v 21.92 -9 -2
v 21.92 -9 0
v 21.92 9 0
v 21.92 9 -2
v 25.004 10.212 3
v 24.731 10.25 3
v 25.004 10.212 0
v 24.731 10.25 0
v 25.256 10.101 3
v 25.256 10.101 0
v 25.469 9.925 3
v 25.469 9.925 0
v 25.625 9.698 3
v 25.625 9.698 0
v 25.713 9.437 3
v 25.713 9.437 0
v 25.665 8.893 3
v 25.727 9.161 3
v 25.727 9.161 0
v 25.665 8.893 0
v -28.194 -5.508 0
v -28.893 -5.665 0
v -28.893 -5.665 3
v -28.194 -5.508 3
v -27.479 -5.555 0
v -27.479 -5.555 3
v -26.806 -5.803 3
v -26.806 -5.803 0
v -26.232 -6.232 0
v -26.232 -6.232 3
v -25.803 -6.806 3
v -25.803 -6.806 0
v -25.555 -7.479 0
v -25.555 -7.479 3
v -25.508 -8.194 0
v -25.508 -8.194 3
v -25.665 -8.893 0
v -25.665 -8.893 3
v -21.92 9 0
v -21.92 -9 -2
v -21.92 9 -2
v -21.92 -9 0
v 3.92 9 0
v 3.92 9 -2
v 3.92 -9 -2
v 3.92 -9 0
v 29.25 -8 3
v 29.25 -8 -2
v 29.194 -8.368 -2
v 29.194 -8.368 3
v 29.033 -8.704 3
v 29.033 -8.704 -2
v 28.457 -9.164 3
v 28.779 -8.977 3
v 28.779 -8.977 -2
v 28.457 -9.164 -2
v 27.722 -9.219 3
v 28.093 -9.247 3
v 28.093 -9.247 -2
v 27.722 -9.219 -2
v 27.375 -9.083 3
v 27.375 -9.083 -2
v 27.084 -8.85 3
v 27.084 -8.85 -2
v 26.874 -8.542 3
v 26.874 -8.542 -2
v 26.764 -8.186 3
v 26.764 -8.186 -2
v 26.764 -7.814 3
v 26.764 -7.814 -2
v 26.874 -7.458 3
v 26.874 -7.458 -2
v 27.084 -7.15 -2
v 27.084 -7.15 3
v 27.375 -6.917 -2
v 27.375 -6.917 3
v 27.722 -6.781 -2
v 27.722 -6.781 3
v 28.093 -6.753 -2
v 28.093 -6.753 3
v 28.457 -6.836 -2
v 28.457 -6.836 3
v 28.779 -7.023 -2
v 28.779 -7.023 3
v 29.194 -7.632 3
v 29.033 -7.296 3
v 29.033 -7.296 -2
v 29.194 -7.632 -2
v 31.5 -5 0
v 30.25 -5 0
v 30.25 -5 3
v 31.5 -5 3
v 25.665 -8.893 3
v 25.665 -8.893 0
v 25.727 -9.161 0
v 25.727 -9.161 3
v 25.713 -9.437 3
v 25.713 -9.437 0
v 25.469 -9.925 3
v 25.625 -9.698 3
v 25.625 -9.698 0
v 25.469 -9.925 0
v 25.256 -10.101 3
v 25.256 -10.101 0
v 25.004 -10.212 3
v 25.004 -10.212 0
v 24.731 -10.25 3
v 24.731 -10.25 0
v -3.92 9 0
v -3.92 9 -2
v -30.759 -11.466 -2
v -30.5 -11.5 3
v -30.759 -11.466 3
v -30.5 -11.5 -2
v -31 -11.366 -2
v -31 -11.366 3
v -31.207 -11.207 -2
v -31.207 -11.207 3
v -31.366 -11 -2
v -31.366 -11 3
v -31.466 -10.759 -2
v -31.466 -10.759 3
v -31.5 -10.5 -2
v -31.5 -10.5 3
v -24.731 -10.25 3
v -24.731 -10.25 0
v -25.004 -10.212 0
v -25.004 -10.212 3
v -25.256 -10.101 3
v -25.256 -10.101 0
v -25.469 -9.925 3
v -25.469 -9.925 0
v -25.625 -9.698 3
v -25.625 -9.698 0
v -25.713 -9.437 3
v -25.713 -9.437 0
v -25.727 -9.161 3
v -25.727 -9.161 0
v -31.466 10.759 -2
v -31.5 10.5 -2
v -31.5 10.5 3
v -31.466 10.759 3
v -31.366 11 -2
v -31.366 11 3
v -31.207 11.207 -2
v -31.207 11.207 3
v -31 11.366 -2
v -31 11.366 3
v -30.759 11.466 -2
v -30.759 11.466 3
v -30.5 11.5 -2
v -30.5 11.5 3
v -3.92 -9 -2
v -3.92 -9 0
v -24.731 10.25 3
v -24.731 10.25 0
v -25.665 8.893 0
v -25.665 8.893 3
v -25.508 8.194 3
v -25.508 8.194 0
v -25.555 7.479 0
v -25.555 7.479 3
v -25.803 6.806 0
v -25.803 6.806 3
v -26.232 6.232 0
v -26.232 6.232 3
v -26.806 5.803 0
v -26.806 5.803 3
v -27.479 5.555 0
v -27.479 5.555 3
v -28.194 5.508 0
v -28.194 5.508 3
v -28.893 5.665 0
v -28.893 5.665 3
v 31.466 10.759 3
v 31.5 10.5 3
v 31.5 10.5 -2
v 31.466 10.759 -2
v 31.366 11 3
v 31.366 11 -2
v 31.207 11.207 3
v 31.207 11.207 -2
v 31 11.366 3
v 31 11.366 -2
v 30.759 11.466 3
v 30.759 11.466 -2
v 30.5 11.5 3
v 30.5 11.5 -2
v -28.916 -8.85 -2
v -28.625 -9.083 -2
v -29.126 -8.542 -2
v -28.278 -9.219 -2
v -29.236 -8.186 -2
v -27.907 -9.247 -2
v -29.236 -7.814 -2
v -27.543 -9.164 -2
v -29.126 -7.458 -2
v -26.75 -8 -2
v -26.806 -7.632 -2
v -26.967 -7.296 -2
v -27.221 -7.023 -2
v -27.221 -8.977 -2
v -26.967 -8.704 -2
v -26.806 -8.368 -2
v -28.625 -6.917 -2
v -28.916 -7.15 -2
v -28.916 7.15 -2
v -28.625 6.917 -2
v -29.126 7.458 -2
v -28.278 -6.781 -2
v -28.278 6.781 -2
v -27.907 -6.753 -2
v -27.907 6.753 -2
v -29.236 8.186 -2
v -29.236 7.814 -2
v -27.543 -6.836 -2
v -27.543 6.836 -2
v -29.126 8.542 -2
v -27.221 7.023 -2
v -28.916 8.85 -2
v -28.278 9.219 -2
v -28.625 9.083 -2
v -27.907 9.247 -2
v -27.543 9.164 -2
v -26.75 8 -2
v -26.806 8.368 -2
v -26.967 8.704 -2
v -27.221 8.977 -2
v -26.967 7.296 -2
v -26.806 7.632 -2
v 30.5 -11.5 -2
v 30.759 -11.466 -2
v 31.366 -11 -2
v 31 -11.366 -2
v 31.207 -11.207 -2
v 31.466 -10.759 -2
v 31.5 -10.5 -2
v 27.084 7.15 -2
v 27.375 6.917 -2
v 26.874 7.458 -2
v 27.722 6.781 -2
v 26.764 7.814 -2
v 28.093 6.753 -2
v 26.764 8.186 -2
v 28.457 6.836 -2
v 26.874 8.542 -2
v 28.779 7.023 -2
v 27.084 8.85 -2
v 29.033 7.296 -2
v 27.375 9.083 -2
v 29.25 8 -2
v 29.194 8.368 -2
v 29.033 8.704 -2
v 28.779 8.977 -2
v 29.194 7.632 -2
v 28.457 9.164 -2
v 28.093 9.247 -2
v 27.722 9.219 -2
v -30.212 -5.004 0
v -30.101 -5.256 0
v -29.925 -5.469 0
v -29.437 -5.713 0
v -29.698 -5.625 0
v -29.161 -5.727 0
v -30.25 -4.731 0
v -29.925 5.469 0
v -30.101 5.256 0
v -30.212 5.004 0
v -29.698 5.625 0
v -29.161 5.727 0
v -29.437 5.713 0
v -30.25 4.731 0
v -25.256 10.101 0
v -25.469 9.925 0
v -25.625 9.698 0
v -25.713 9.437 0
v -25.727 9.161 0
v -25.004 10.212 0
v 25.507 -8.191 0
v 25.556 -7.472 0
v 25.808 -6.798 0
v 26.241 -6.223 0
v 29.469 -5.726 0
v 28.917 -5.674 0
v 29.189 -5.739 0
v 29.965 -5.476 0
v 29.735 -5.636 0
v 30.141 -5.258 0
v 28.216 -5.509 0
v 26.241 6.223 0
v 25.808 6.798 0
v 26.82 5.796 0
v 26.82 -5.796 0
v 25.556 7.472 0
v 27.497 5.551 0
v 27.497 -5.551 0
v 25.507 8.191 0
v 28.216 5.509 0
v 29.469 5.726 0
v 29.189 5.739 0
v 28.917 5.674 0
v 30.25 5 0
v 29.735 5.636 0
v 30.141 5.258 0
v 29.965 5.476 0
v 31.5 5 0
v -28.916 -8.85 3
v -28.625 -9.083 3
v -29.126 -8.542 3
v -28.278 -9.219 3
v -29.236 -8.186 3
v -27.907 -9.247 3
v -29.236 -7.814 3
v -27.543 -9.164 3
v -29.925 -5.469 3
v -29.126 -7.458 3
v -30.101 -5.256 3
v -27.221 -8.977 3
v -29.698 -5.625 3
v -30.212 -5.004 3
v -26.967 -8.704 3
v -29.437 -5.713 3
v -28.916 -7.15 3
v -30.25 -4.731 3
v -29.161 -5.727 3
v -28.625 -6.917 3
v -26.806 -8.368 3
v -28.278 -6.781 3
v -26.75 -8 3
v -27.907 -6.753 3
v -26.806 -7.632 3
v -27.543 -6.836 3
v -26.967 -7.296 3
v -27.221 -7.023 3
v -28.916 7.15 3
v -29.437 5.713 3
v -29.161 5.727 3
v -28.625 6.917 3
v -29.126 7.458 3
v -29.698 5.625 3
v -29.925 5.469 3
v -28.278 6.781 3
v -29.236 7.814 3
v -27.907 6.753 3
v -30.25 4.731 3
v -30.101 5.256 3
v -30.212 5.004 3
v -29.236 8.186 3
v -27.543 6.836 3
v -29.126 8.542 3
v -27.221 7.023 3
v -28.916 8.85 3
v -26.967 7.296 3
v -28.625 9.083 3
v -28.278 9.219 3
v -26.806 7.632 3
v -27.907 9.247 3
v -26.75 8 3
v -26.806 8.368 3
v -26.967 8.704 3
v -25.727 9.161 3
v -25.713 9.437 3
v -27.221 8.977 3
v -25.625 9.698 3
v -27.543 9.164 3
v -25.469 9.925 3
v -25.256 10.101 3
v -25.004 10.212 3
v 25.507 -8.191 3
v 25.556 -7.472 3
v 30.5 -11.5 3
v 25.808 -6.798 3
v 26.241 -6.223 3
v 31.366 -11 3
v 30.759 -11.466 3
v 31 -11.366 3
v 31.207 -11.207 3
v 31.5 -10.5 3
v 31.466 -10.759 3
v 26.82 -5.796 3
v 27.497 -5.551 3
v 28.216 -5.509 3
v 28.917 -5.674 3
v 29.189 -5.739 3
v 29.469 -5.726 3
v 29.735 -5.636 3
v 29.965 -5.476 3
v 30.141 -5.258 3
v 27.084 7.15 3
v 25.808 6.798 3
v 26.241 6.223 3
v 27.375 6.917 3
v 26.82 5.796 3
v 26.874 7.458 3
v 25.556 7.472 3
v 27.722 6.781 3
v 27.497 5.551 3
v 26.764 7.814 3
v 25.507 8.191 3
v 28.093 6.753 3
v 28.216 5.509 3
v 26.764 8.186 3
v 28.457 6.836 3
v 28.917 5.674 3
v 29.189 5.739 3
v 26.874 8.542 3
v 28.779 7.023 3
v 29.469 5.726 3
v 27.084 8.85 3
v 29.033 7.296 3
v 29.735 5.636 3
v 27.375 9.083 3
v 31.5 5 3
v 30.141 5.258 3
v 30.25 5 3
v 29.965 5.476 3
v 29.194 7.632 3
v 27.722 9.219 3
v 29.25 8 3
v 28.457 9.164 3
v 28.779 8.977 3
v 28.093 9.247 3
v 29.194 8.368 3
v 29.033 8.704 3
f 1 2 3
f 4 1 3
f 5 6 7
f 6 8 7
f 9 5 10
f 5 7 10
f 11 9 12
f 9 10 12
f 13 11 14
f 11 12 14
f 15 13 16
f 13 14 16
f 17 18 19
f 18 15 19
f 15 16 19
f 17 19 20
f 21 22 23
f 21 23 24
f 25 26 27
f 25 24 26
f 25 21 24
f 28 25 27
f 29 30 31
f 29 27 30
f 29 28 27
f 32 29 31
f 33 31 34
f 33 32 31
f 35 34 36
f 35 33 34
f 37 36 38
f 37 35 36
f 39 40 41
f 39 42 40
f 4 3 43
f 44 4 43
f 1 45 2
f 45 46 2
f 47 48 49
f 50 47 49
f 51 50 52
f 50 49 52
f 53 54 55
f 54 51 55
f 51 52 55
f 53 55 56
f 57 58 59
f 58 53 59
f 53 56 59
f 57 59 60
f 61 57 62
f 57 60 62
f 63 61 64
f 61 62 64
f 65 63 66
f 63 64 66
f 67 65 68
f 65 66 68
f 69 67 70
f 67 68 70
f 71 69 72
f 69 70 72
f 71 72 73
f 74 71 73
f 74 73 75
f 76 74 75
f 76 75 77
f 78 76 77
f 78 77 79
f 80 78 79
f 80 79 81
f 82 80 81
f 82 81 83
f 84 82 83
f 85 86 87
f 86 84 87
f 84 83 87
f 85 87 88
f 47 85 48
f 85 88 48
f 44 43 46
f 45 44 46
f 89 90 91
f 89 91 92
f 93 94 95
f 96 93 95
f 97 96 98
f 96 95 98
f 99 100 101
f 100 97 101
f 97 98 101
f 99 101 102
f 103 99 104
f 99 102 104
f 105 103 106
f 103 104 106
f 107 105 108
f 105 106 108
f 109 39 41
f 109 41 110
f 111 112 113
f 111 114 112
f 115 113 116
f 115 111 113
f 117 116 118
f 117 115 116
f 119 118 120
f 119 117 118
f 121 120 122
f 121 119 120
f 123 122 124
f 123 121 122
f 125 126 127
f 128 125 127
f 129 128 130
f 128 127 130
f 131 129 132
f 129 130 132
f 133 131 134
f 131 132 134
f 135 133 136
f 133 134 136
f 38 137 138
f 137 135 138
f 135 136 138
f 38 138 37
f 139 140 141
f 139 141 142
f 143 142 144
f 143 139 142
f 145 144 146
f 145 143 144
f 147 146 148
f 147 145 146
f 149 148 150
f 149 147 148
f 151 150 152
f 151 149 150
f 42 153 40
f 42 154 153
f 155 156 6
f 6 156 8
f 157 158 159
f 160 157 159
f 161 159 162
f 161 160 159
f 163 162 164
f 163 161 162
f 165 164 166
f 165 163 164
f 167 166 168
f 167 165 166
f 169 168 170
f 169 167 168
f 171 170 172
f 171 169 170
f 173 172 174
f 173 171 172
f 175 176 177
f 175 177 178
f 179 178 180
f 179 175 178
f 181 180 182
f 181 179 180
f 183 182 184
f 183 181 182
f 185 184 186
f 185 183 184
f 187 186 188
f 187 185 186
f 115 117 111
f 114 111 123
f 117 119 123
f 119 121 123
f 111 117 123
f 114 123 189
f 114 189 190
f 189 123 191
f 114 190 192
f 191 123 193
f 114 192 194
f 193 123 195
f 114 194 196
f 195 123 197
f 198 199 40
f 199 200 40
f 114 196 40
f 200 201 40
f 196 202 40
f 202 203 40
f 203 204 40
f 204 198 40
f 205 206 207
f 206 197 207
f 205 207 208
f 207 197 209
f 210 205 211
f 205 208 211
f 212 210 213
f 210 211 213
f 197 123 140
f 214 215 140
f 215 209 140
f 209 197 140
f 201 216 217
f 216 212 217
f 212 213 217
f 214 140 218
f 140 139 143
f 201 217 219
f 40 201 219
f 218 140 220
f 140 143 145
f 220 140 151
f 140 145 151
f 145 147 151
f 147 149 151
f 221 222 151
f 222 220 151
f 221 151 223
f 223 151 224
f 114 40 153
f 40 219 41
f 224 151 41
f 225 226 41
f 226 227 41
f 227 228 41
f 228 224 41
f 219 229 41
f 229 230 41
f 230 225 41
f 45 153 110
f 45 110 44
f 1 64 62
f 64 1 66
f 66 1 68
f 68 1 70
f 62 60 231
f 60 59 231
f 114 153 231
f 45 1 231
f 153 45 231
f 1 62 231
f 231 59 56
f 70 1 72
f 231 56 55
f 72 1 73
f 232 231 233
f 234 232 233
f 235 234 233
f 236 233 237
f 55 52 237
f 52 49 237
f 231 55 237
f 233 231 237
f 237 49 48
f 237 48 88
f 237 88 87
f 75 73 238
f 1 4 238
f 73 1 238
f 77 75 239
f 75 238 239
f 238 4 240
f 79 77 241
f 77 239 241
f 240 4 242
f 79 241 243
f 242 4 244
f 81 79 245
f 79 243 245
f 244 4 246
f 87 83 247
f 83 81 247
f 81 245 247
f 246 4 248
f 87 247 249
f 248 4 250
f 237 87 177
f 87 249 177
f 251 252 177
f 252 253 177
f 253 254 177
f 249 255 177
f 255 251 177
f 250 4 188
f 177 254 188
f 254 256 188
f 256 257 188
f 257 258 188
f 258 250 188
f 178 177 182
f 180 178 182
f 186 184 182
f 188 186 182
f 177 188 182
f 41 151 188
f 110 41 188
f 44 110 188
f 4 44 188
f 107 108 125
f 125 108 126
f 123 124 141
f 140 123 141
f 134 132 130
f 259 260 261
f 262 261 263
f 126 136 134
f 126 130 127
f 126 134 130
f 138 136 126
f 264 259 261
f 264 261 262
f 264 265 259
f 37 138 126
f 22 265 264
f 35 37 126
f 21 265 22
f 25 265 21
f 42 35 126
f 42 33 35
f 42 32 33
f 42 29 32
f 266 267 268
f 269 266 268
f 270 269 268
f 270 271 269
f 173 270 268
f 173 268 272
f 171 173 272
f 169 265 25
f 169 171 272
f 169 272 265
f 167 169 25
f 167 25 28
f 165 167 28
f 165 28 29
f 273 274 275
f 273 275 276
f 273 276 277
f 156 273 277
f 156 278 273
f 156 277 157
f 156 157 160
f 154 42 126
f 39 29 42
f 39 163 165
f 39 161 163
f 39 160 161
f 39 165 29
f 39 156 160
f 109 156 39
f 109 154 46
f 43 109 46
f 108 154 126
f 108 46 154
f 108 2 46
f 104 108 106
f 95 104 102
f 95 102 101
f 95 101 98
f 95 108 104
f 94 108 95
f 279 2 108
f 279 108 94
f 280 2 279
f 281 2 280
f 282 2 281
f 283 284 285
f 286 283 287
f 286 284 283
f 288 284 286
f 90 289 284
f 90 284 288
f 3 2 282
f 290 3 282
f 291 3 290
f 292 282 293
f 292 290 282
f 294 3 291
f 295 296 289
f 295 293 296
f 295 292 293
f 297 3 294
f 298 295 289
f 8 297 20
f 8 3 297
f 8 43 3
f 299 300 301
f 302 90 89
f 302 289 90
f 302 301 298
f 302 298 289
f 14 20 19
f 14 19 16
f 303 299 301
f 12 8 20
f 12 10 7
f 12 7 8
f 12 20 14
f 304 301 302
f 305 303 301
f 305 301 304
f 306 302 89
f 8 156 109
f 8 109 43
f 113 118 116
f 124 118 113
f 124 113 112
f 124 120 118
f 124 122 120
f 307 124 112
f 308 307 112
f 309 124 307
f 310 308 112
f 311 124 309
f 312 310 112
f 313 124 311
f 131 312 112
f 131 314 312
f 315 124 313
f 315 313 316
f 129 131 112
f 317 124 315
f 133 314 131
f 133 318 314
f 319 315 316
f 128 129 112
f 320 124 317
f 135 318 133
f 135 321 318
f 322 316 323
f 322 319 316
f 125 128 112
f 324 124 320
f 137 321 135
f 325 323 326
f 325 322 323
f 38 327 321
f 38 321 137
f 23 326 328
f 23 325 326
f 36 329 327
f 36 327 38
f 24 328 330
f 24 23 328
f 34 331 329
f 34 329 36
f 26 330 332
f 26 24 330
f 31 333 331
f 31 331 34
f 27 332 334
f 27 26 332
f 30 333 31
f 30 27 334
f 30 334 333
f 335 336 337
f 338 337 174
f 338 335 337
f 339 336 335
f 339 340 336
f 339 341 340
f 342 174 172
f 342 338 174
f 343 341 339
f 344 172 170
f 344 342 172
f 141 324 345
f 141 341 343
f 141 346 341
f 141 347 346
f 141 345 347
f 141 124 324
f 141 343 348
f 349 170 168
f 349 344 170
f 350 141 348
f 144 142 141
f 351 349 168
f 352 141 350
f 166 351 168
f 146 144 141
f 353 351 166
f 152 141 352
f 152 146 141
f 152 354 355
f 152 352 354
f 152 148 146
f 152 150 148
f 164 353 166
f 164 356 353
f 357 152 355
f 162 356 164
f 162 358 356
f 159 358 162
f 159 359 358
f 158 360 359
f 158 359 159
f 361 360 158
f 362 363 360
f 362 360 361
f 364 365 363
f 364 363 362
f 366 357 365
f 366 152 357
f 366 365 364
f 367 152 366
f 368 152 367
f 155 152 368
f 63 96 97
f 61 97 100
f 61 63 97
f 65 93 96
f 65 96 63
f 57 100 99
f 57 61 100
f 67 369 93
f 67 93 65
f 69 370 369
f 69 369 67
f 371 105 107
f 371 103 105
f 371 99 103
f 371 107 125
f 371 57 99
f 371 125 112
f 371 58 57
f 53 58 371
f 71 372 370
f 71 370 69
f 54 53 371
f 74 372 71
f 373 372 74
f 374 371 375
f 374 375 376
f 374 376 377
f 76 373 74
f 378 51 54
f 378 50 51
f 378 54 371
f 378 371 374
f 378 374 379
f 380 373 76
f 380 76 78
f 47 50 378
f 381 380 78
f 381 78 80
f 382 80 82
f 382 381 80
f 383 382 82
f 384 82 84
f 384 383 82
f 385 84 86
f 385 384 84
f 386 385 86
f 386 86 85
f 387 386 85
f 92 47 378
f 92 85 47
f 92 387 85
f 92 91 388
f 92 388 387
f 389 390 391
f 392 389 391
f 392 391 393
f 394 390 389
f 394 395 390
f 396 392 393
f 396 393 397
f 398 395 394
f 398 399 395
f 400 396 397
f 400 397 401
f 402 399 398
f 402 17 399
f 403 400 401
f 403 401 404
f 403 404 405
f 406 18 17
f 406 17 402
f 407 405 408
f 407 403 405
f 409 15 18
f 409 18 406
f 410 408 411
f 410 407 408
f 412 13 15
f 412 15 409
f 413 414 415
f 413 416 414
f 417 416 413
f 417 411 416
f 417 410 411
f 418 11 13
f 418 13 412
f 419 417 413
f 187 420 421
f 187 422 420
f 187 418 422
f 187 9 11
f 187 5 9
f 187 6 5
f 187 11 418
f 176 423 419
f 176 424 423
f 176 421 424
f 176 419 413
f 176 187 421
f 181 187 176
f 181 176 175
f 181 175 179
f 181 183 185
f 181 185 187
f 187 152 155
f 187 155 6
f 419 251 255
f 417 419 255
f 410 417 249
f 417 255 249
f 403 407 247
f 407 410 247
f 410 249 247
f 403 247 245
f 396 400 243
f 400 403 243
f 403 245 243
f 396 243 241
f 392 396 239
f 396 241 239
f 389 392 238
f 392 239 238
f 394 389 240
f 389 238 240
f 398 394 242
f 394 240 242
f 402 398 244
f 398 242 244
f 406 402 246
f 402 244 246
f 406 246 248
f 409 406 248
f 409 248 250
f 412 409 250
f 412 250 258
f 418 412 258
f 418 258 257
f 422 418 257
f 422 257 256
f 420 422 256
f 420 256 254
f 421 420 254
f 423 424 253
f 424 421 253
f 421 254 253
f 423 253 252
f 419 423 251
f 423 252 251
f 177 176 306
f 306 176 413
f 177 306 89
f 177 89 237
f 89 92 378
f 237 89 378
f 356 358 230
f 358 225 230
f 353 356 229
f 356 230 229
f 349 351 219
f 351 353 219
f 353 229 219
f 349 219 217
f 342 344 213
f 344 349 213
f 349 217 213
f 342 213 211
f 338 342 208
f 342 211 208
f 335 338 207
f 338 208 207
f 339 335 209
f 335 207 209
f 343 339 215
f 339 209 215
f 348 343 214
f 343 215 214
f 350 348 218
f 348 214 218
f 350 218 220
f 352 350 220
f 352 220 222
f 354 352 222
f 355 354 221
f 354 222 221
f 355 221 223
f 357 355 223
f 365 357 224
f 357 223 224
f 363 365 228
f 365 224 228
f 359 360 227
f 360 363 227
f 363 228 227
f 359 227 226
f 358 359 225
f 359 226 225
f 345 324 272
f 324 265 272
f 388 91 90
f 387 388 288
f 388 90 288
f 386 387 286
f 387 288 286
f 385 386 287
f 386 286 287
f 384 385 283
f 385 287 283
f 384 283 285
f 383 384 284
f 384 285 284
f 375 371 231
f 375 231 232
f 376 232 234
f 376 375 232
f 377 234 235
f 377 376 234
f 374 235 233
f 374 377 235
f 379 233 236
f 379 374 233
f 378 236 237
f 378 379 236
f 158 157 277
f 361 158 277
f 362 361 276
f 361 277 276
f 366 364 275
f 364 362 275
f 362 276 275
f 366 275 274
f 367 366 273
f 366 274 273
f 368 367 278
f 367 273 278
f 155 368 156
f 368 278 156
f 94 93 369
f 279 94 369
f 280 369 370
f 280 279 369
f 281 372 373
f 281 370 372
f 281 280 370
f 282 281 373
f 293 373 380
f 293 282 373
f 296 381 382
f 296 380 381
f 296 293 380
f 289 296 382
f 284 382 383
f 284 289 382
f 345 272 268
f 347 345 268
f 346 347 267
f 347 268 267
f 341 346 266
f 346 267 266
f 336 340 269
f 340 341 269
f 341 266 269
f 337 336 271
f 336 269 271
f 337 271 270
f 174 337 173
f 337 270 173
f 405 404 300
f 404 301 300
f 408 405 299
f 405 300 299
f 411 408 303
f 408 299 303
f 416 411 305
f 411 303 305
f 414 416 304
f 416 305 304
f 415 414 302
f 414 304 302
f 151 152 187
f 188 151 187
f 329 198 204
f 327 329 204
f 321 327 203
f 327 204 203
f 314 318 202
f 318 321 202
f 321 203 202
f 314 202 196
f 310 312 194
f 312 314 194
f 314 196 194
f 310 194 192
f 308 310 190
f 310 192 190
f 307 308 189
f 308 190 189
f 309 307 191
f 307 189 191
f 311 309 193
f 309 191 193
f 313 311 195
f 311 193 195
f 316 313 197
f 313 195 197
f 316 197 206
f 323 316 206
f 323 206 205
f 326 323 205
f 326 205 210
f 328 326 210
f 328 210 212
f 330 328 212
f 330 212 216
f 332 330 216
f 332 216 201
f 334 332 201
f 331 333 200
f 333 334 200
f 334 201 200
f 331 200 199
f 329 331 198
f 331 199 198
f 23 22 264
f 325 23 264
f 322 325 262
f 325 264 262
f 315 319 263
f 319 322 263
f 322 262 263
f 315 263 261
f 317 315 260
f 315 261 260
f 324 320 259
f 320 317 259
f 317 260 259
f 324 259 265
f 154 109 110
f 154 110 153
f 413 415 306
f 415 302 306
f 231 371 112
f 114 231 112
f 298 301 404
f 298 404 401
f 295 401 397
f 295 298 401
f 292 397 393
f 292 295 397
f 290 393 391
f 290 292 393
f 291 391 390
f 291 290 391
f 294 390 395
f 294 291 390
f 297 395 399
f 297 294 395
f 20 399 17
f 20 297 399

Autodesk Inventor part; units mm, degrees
ref_plane "YZ Plane" through (0, 0, 0) normal (1, 0, 0) x (0, 1, 0)
ref_plane "XZ Plane" through (0, 0, 0) normal (0, 1, 0) x (-1, 0, 0)
ref_plane "XY Plane" through (0, 0, 0) normal (0, 0, 1) x (1, 0, 0)
sketch "スケッチ1" plane through (0, 0, 0) normal (0, 0, 1) x (1, 0, 0)
  line L0 (-31.5, 11.5) -> (31.5, 11.5)
  line L1 (31.5, 11.5) -> (31.5, -11.5)
  line L2 (31.5, -11.5) -> (-31.5, -11.5)
  line L3 (-31.5, -11.5) -> (-31.5, 11.5)
  line L4 (-31.5, 11.5) -> (31.5, -11.5) construction
  line L5 (31.5, 11.5) -> (-31.5, -11.5) construction
  line L6 (-30, 10) -> (30, 10) construction
  line L7 (30, 10) -> (30, -10) construction
  line L8 (30, -10) -> (-30, -10) construction
  line L9 (-30, -10) -> (-30, 10) construction
  line L10 (-30, 10) -> (30, -10) construction
  line L11 (30, 10) -> (-30, -10) construction
  circle A0 centre (-28, 8) radius 1.25
  line L12 (-31.5, 0) -> (31.5, 0) construction
  line L13 (0, 11.5) -> (0, -11.5) construction
  circle A1 centre (-28, -8) radius 1.25
  circle A2 centre (28, 8) radius 1.25
  circle A3 centre (28, -8) radius 1.25
  line L14 (-30.25, 10.25) -> (30.25, 10.25)
  line L15 (30.25, 10.25) -> (30.25, -10.25)
  line L16 (30.25, -10.25) -> (-30.25, -10.25)
  line L17 (-30.25, -10.25) -> (-30.25, 10.25)
  line L18 (-30.25, 10.25) -> (30.25, -10.25) construction
  line L19 (30.25, 10.25) -> (-30.25, -10.25) construction
  line L20 (-21.92, 9) -> (-3.92, 9)
  line L21 (-3.92, 9) -> (-3.92, -9)
  line L22 (-3.92, -9) -> (-21.92, -9)
  line L23 (-21.92, -9) -> (-21.92, 9)
  line L24 (-21.92, 9) -> (-3.92, -9) construction
  line L25 (-3.92, 9) -> (-21.92, -9) construction
  line L26 (21.92, 9) -> (3.92, 9)
  line L27 (3.92, 9) -> (3.92, -9)
  line L28 (3.92, -9) -> (21.92, -9)
  line L29 (21.92, -9) -> (21.92, 9)
  line L30 (21.92, 9) -> (3.92, -9) construction
  line L31 (3.92, 9) -> (21.92, -9) construction
  arc A4 (-30.25, 6.9103) -> (-26.9103, 10.25) centre (-28, 8) ccw
  arc A5 (-26.9103, -10.25) -> (-30.25, -6.9103) centre (-28, -8) ccw
  arc A6 (26.9103, 10.25) -> (30.25, 6.9103) centre (28, 8) ccw
  arc A7 (30.25, -6.9103) -> (26.9103, -10.25) centre (28, -8) ccw
  line L32 (30.25, 5) -> (31.5, 5)
  line L33 (30.25, -5) -> (31.5, -5)
  point P0 (0, 0)
  point P1 (0, 0)
  point P2 (-12.92, 0)
  point P3 (12.92, 0)
  point P4 (30.25, -6.9103)
  point P5 (26.9103, -10.25)
  point P6 (-30.25, -6.9103)
  point P7 (30.25, 6.9103)
  dimension "d0" = 63
  dimension "d1" = 60
  dimension "d2" = 20
  dimension "d3" = 23
  dimension "d4" = 2.5
  dimension "d5" = 2
  dimension "d6" = 2
  dimension "d7" = 20.5
  dimension "d8" = 60.5
  dimension "d17" = 18
  dimension "d18" = 18
  dimension "d19" = 17.08
  dimension "d22" = 2.5
  dimension "d23" = 10
extrude "押し出し1" add sketch "スケッチ1" against normal blind 2
extrude "押し出し5" add sketch "スケッチ1" along normal blind 3 contours L0 L1 L32 L15 L14 L17 L16 L33 L2 L3 | A6 L14 L15 | L15 L16 A7 | A4 L17 L14 | L16 L17 A5
fillet "フィレット2" radius 1 12 edges at (-31.5, 11.5, 0.5) (-31.5, -11.5, 0.5) (31.5, -11.5, 0.5) (31.5, 11.5, 0.5) (26.9103, 10.25, 1.5) (30.25, 6.9103, 1.5) (30.25, -6.9103, 1.5) (26.9103, -10.25, 1.5) (-26.9103, -10.25, 1.5) (-30.25, -6.9103, 1.5) (-30.25, 6.9103, 1.5) (-26.9103, 10.25, 1.5)
equation "\"d6\" = d5"
equation "\"d17\" = d18"
properties part number "StartStopSwitch_cover_01" material "アセタール樹脂、黒"
